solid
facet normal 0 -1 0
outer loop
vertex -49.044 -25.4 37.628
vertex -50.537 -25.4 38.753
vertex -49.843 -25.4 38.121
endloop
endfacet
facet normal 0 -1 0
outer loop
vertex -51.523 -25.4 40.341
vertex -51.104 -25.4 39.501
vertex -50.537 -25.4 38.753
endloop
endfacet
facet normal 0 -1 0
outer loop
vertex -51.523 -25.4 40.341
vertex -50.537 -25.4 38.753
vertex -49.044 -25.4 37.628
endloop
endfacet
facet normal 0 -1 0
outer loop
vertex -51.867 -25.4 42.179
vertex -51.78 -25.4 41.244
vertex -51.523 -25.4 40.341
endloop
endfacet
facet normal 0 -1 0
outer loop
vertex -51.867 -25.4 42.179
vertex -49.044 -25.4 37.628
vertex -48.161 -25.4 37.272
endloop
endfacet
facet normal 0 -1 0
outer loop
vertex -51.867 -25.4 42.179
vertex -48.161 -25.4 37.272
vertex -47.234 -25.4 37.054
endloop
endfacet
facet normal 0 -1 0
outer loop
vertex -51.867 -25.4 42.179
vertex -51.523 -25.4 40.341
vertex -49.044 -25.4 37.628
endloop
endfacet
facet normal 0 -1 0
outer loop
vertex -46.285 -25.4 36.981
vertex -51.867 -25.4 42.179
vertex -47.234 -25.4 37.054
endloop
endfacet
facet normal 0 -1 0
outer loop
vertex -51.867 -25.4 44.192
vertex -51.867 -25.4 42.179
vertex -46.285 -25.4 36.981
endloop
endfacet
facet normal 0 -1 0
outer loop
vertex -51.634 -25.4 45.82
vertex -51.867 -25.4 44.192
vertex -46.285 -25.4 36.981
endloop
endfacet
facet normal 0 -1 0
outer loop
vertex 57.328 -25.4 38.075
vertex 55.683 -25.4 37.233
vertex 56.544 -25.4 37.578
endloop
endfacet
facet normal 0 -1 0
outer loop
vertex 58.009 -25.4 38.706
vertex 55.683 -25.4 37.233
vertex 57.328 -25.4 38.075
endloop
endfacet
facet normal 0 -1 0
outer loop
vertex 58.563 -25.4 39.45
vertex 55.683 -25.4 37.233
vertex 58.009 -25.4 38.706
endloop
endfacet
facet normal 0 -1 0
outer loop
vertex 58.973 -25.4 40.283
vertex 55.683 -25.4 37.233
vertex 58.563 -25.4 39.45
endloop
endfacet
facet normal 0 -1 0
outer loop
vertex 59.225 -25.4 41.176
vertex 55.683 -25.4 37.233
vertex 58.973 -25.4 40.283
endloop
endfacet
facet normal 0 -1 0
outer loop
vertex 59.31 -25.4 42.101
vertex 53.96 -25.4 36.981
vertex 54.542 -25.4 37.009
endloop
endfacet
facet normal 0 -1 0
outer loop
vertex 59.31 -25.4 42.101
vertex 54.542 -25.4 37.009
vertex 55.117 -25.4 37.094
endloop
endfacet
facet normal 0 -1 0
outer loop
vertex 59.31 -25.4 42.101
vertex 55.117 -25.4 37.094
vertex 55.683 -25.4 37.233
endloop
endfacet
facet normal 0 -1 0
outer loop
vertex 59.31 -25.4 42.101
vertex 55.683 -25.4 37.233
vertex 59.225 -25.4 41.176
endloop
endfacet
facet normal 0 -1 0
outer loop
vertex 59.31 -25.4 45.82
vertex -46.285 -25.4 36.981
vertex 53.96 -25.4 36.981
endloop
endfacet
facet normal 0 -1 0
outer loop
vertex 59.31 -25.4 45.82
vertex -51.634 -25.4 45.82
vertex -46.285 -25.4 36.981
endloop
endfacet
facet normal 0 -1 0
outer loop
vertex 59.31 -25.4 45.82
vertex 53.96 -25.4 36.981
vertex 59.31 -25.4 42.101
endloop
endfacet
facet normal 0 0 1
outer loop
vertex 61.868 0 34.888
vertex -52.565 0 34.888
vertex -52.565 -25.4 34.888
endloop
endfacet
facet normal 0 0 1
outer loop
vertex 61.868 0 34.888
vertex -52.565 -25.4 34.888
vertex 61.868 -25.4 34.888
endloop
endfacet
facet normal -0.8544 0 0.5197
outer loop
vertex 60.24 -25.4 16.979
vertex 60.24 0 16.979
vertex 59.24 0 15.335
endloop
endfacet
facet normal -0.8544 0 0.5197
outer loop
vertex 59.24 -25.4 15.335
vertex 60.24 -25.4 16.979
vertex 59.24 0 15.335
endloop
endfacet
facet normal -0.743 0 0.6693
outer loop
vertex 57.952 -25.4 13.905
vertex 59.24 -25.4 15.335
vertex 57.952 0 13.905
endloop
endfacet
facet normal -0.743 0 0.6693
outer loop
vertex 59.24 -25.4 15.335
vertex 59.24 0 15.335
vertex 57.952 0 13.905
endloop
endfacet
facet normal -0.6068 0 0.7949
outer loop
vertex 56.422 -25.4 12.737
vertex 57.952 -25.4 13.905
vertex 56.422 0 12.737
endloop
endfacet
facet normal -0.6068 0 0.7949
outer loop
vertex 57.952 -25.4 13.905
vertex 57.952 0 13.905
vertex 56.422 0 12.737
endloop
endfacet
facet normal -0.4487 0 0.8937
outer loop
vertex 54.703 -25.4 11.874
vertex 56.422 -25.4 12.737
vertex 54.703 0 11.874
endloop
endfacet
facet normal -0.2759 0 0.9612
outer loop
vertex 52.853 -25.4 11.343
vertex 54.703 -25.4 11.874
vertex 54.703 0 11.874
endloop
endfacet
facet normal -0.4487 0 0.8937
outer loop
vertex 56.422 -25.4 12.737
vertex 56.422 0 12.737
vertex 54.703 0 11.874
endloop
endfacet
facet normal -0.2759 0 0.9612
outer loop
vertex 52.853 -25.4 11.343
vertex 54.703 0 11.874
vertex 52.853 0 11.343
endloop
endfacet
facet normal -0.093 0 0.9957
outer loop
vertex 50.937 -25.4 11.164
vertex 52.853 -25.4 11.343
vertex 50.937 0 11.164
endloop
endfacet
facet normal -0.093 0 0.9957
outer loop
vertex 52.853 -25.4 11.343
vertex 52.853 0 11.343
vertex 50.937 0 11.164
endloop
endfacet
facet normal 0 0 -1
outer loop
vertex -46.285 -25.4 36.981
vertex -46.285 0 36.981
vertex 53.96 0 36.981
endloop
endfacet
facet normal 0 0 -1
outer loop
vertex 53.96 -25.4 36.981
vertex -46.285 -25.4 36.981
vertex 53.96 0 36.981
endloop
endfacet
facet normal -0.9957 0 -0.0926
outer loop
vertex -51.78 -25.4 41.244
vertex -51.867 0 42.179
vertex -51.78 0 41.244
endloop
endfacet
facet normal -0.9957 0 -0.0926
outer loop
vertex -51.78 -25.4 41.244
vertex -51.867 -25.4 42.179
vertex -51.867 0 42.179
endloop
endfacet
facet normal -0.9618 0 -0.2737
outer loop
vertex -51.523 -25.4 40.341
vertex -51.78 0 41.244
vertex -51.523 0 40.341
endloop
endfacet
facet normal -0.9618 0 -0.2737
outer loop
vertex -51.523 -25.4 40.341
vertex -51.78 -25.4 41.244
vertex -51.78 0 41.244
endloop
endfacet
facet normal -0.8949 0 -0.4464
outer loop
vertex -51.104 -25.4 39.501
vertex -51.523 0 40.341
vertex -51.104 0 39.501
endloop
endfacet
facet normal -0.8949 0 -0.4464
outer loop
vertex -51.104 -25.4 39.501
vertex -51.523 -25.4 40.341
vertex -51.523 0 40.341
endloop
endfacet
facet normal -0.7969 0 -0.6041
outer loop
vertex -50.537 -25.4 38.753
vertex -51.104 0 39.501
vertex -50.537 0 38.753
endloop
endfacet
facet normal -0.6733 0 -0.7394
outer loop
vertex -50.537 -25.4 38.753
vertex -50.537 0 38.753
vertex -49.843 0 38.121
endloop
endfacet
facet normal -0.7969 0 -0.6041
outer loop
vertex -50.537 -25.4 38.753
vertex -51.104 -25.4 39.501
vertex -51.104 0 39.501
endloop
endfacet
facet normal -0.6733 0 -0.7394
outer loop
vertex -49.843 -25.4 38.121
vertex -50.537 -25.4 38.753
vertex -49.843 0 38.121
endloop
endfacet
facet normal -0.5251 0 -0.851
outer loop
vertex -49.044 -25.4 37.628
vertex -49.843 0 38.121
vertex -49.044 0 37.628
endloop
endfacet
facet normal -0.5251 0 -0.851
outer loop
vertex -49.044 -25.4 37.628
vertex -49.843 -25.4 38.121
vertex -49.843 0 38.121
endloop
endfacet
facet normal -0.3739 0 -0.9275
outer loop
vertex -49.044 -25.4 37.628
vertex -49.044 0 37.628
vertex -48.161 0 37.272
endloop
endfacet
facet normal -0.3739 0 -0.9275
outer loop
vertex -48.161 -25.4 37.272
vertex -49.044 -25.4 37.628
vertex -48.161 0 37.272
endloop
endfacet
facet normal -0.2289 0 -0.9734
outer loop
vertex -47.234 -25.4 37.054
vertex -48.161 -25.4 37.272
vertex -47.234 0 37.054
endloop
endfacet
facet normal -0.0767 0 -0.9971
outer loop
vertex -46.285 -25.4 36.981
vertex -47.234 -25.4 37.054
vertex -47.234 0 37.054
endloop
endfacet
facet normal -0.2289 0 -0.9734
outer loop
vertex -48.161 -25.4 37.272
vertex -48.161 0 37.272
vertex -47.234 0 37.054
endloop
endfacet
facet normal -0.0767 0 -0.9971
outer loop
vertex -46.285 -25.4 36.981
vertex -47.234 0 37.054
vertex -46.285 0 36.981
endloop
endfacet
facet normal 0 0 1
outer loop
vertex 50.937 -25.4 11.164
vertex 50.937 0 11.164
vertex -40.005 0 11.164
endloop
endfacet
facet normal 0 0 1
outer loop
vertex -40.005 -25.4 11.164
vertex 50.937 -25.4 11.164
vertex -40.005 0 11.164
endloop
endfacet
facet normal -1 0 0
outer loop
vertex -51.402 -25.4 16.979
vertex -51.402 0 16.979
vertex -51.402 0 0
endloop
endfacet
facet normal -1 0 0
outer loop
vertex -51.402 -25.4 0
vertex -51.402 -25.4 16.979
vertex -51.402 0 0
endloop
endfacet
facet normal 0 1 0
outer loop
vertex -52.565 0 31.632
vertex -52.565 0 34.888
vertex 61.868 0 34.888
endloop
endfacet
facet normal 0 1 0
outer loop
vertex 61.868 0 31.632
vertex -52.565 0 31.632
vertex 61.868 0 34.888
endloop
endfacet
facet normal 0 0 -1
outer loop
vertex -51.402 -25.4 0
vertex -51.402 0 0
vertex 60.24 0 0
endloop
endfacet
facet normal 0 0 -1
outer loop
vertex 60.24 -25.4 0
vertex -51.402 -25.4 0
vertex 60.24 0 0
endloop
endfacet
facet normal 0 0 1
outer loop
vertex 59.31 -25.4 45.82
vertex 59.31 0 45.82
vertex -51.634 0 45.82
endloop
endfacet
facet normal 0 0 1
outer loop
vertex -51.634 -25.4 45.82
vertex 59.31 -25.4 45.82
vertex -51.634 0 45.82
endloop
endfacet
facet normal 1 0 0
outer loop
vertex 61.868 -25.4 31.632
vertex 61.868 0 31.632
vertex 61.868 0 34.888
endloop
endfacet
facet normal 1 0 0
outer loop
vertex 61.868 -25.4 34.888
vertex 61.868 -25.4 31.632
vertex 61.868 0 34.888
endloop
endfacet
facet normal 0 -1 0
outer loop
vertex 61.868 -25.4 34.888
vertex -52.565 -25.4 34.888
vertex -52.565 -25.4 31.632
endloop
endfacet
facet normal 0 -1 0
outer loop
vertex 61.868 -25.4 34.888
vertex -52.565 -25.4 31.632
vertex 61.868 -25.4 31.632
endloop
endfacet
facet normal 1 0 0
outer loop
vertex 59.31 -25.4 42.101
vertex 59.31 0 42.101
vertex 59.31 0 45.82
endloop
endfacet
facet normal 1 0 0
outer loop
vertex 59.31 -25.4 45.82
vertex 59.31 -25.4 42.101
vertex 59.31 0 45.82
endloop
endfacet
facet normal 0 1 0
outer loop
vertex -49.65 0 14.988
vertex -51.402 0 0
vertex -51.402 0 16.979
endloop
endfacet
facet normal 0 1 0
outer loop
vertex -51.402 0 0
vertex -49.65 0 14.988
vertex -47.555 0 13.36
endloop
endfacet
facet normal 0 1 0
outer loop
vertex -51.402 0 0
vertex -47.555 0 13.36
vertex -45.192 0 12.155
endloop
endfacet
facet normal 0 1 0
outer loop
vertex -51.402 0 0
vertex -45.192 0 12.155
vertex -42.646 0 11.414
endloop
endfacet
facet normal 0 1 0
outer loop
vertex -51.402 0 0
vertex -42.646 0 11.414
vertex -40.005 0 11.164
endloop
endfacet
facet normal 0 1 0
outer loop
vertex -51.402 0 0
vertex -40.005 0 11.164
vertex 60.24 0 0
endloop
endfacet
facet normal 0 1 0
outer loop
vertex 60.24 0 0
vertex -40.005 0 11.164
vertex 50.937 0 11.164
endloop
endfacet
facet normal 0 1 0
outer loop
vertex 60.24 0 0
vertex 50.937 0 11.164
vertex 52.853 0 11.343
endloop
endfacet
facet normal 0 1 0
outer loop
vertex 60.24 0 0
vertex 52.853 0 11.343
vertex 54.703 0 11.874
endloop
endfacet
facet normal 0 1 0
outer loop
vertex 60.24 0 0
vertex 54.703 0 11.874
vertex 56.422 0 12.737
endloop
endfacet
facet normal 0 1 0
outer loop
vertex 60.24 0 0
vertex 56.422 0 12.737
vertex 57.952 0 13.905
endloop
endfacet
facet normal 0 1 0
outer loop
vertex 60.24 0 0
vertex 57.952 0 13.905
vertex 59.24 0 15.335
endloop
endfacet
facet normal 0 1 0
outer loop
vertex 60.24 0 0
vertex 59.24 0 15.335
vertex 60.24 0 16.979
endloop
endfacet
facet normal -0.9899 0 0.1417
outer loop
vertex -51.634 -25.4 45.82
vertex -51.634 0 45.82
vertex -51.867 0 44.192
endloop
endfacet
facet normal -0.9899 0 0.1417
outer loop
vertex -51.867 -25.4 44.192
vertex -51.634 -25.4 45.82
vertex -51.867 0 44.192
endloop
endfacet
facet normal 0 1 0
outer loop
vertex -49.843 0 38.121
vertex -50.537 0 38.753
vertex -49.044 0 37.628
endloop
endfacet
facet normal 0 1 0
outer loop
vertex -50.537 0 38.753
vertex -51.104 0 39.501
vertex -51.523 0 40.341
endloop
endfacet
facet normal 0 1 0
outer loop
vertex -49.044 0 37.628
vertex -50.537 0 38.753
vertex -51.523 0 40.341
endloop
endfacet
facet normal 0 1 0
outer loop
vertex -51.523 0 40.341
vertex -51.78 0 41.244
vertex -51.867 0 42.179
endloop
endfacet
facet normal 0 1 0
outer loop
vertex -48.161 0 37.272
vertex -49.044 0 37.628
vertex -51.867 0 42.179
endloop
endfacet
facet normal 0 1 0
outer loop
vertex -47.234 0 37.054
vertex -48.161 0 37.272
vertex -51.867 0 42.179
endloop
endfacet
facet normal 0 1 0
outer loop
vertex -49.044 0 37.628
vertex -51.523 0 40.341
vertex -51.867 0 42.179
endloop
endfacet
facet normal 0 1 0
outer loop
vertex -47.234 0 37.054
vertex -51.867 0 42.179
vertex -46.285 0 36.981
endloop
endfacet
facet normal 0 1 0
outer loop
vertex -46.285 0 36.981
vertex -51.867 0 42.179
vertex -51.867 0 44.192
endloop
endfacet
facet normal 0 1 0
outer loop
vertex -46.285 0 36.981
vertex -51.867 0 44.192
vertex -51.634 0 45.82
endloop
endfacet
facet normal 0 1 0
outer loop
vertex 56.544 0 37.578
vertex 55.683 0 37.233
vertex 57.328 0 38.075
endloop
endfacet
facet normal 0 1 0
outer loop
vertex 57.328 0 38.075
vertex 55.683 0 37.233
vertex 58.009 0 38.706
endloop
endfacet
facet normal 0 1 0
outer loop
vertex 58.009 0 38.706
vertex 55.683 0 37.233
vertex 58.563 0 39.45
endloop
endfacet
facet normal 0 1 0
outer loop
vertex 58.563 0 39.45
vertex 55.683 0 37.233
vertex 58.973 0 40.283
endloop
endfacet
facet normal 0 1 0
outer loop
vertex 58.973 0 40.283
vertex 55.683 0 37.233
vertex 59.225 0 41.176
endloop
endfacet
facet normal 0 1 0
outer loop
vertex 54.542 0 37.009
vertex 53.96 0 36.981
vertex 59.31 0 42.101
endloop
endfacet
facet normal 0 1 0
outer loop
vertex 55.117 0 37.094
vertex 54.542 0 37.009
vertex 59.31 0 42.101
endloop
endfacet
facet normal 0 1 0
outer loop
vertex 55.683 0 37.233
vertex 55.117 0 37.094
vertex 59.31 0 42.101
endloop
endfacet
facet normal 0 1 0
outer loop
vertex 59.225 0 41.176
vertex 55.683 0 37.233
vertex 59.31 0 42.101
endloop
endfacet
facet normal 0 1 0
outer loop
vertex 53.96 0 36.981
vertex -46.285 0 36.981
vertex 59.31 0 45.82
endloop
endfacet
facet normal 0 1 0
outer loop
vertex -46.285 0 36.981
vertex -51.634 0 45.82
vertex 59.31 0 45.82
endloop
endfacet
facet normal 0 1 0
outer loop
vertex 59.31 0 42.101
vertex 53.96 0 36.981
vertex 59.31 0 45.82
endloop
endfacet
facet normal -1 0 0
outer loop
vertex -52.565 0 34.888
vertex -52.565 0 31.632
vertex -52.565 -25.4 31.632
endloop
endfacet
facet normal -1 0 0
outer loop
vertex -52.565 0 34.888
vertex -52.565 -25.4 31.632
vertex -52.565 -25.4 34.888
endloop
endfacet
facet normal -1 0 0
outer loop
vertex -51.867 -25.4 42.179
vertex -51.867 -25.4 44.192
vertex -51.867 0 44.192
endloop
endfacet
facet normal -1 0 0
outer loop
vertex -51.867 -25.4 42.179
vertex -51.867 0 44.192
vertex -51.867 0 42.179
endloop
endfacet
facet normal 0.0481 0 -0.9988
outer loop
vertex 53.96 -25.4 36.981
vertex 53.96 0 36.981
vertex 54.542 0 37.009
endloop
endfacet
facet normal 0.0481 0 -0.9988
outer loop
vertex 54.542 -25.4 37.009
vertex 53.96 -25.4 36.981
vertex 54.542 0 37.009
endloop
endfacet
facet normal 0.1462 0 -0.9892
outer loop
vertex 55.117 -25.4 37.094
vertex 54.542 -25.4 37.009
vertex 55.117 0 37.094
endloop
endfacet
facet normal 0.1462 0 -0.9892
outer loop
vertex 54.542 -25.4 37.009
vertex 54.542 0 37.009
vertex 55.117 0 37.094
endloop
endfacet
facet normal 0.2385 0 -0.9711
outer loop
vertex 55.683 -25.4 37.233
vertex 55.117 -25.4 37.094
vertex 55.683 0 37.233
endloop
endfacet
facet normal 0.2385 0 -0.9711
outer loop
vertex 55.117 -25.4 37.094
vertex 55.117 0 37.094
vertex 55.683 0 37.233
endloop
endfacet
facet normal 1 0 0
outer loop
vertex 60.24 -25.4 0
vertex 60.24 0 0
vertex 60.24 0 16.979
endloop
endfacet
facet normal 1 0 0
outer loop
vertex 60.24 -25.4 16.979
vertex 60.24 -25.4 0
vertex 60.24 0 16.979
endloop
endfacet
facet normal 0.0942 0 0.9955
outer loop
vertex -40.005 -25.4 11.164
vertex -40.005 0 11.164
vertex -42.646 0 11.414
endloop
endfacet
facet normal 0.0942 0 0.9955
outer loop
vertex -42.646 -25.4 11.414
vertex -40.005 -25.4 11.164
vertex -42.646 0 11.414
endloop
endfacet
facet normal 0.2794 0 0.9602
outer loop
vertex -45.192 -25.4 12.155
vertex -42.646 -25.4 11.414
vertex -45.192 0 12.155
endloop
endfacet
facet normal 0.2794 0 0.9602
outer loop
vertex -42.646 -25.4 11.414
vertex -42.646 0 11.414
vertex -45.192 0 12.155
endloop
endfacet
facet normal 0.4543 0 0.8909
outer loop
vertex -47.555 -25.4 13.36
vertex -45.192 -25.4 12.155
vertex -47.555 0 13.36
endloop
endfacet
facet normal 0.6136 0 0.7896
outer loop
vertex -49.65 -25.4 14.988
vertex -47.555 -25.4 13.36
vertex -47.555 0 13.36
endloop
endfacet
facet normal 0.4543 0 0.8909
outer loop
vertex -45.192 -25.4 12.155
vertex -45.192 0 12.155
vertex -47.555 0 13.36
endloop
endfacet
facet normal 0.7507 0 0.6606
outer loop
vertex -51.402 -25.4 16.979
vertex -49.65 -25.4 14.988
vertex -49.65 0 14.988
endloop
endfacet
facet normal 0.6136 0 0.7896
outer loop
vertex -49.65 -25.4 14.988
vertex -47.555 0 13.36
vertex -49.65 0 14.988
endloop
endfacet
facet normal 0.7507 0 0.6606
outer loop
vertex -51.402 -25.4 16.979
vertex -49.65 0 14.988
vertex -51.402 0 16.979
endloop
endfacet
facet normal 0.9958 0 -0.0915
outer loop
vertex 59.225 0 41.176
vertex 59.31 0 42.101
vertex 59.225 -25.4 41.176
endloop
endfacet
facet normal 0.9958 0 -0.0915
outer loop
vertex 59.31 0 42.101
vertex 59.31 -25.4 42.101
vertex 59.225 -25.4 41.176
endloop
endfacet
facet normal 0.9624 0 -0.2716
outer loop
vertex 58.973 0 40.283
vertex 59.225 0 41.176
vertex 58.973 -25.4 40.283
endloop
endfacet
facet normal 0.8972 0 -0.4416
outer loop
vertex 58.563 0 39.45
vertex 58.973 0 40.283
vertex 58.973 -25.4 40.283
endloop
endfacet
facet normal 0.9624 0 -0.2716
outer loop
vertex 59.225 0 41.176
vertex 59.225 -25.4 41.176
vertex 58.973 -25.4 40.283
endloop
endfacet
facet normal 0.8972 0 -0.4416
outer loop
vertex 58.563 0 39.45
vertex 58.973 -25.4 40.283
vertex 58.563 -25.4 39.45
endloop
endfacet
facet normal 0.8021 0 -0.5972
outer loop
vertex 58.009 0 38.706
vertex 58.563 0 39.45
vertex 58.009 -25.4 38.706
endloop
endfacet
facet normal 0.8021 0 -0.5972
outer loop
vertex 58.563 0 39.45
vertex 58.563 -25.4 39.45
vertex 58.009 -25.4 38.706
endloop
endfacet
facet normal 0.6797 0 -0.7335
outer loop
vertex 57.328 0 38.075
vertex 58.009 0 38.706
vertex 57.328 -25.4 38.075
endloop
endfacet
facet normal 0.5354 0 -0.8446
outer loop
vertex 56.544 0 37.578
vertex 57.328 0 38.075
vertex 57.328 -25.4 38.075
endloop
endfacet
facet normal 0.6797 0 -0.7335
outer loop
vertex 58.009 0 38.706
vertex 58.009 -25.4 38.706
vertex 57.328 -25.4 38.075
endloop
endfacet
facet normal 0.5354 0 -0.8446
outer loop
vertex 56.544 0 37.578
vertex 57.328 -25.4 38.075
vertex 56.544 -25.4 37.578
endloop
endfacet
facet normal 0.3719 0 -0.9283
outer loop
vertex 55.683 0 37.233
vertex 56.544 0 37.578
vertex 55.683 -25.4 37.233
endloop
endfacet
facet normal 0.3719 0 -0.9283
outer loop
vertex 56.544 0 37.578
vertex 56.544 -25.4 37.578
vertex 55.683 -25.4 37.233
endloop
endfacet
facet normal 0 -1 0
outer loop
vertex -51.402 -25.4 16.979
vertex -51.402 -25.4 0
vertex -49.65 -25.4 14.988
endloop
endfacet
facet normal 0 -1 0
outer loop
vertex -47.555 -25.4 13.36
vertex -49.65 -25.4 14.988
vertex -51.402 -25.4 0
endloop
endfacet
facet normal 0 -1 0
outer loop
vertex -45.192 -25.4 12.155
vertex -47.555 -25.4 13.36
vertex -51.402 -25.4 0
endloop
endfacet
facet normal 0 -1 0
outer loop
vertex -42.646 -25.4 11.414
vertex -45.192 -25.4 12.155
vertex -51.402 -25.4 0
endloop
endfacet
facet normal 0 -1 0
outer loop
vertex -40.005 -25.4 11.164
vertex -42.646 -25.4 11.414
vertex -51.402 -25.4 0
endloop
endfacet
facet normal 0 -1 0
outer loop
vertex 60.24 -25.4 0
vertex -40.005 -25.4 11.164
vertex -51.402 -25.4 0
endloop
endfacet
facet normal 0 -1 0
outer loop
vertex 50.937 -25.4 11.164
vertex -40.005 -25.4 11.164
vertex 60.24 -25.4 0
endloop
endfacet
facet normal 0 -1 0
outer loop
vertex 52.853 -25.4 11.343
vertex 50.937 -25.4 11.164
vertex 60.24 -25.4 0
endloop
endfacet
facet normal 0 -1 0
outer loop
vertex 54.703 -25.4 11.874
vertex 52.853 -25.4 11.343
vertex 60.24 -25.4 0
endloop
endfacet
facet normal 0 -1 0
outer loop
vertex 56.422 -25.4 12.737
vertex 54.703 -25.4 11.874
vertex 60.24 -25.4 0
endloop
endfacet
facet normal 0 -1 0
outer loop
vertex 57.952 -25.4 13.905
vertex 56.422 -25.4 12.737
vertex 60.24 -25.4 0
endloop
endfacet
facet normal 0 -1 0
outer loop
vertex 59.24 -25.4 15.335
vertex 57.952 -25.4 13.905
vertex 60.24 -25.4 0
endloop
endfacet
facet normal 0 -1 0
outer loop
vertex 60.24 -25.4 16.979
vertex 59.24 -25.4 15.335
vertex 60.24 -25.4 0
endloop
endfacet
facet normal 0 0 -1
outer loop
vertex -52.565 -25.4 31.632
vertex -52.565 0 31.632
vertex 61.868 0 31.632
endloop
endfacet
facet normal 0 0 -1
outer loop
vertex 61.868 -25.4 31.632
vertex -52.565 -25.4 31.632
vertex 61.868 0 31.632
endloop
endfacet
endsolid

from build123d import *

# Parameters (mm, degrees)
F0_W     = 114.432908
F0_H     = 3.25622
F1_DEPTH = 25.4
F2_R     = 5.08
F3_R     = 5.08


with BuildPart() as f1:
    # F0 (on Front) → F1 (new body)
    with BuildSketch(Plane.XZ):
        with BuildLine():
            Line((-51.634364, 45.819677), (-51.866949, 44.191573))
            Line((-51.866949, 44.191573), (-51.866949, 40.470175))
            ThreePointArc((-51.866949, 40.470175), (-49.57619, 37.925309), (-46.284854, 36.981367))
            Line((-46.284854, 36.981367), (53.96023, 36.981367))
            ThreePointArc((53.96023, 36.981367), (57.091531, 37.859433), (59.309736, 40.237587))
            Line((59.309736, 40.237587), (59.309736, 45.819677))
            Line((59.309736, 45.819677), (-51.634364, 45.819677))
        make_face()
        with Locations((4.651744, 33.259971)):
            Rectangle(F0_W, F0_H)
        with BuildLine():
            ThreePointArc((-40.005002, 11.164187), (-46.402206, 12.701842), (-51.401772, 16.978865))
            Line((-51.401772, 16.978865), (-51.401772, 0))
            Line((-51.401772, 0), (60.240086, 0))
            Line((60.240086, 0), (60.240086, 16.978865))
            ThreePointArc((60.240086, 16.978865), (56.422156, 12.737424), (50.936598, 11.164187))
            Line((50.936598, 11.164187), (-40.005002, 11.164187))
        make_face()
    extrude(amount=F1_DEPTH)

    # F2
    f2_edges = [f1.edges().sort_by_distance(p)[0] for p in [
        (-51.866949, -12.7, 40.470175),
    ]]
    fillet(f2_edges, radius=F2_R)

    # F3
    f3_edges = [f1.edges().sort_by_distance(p)[0] for p in [
        (59.309736, -12.7, 40.237587),
    ]]
    fillet(f3_edges, radius=F3_R)


solid = f1.part
